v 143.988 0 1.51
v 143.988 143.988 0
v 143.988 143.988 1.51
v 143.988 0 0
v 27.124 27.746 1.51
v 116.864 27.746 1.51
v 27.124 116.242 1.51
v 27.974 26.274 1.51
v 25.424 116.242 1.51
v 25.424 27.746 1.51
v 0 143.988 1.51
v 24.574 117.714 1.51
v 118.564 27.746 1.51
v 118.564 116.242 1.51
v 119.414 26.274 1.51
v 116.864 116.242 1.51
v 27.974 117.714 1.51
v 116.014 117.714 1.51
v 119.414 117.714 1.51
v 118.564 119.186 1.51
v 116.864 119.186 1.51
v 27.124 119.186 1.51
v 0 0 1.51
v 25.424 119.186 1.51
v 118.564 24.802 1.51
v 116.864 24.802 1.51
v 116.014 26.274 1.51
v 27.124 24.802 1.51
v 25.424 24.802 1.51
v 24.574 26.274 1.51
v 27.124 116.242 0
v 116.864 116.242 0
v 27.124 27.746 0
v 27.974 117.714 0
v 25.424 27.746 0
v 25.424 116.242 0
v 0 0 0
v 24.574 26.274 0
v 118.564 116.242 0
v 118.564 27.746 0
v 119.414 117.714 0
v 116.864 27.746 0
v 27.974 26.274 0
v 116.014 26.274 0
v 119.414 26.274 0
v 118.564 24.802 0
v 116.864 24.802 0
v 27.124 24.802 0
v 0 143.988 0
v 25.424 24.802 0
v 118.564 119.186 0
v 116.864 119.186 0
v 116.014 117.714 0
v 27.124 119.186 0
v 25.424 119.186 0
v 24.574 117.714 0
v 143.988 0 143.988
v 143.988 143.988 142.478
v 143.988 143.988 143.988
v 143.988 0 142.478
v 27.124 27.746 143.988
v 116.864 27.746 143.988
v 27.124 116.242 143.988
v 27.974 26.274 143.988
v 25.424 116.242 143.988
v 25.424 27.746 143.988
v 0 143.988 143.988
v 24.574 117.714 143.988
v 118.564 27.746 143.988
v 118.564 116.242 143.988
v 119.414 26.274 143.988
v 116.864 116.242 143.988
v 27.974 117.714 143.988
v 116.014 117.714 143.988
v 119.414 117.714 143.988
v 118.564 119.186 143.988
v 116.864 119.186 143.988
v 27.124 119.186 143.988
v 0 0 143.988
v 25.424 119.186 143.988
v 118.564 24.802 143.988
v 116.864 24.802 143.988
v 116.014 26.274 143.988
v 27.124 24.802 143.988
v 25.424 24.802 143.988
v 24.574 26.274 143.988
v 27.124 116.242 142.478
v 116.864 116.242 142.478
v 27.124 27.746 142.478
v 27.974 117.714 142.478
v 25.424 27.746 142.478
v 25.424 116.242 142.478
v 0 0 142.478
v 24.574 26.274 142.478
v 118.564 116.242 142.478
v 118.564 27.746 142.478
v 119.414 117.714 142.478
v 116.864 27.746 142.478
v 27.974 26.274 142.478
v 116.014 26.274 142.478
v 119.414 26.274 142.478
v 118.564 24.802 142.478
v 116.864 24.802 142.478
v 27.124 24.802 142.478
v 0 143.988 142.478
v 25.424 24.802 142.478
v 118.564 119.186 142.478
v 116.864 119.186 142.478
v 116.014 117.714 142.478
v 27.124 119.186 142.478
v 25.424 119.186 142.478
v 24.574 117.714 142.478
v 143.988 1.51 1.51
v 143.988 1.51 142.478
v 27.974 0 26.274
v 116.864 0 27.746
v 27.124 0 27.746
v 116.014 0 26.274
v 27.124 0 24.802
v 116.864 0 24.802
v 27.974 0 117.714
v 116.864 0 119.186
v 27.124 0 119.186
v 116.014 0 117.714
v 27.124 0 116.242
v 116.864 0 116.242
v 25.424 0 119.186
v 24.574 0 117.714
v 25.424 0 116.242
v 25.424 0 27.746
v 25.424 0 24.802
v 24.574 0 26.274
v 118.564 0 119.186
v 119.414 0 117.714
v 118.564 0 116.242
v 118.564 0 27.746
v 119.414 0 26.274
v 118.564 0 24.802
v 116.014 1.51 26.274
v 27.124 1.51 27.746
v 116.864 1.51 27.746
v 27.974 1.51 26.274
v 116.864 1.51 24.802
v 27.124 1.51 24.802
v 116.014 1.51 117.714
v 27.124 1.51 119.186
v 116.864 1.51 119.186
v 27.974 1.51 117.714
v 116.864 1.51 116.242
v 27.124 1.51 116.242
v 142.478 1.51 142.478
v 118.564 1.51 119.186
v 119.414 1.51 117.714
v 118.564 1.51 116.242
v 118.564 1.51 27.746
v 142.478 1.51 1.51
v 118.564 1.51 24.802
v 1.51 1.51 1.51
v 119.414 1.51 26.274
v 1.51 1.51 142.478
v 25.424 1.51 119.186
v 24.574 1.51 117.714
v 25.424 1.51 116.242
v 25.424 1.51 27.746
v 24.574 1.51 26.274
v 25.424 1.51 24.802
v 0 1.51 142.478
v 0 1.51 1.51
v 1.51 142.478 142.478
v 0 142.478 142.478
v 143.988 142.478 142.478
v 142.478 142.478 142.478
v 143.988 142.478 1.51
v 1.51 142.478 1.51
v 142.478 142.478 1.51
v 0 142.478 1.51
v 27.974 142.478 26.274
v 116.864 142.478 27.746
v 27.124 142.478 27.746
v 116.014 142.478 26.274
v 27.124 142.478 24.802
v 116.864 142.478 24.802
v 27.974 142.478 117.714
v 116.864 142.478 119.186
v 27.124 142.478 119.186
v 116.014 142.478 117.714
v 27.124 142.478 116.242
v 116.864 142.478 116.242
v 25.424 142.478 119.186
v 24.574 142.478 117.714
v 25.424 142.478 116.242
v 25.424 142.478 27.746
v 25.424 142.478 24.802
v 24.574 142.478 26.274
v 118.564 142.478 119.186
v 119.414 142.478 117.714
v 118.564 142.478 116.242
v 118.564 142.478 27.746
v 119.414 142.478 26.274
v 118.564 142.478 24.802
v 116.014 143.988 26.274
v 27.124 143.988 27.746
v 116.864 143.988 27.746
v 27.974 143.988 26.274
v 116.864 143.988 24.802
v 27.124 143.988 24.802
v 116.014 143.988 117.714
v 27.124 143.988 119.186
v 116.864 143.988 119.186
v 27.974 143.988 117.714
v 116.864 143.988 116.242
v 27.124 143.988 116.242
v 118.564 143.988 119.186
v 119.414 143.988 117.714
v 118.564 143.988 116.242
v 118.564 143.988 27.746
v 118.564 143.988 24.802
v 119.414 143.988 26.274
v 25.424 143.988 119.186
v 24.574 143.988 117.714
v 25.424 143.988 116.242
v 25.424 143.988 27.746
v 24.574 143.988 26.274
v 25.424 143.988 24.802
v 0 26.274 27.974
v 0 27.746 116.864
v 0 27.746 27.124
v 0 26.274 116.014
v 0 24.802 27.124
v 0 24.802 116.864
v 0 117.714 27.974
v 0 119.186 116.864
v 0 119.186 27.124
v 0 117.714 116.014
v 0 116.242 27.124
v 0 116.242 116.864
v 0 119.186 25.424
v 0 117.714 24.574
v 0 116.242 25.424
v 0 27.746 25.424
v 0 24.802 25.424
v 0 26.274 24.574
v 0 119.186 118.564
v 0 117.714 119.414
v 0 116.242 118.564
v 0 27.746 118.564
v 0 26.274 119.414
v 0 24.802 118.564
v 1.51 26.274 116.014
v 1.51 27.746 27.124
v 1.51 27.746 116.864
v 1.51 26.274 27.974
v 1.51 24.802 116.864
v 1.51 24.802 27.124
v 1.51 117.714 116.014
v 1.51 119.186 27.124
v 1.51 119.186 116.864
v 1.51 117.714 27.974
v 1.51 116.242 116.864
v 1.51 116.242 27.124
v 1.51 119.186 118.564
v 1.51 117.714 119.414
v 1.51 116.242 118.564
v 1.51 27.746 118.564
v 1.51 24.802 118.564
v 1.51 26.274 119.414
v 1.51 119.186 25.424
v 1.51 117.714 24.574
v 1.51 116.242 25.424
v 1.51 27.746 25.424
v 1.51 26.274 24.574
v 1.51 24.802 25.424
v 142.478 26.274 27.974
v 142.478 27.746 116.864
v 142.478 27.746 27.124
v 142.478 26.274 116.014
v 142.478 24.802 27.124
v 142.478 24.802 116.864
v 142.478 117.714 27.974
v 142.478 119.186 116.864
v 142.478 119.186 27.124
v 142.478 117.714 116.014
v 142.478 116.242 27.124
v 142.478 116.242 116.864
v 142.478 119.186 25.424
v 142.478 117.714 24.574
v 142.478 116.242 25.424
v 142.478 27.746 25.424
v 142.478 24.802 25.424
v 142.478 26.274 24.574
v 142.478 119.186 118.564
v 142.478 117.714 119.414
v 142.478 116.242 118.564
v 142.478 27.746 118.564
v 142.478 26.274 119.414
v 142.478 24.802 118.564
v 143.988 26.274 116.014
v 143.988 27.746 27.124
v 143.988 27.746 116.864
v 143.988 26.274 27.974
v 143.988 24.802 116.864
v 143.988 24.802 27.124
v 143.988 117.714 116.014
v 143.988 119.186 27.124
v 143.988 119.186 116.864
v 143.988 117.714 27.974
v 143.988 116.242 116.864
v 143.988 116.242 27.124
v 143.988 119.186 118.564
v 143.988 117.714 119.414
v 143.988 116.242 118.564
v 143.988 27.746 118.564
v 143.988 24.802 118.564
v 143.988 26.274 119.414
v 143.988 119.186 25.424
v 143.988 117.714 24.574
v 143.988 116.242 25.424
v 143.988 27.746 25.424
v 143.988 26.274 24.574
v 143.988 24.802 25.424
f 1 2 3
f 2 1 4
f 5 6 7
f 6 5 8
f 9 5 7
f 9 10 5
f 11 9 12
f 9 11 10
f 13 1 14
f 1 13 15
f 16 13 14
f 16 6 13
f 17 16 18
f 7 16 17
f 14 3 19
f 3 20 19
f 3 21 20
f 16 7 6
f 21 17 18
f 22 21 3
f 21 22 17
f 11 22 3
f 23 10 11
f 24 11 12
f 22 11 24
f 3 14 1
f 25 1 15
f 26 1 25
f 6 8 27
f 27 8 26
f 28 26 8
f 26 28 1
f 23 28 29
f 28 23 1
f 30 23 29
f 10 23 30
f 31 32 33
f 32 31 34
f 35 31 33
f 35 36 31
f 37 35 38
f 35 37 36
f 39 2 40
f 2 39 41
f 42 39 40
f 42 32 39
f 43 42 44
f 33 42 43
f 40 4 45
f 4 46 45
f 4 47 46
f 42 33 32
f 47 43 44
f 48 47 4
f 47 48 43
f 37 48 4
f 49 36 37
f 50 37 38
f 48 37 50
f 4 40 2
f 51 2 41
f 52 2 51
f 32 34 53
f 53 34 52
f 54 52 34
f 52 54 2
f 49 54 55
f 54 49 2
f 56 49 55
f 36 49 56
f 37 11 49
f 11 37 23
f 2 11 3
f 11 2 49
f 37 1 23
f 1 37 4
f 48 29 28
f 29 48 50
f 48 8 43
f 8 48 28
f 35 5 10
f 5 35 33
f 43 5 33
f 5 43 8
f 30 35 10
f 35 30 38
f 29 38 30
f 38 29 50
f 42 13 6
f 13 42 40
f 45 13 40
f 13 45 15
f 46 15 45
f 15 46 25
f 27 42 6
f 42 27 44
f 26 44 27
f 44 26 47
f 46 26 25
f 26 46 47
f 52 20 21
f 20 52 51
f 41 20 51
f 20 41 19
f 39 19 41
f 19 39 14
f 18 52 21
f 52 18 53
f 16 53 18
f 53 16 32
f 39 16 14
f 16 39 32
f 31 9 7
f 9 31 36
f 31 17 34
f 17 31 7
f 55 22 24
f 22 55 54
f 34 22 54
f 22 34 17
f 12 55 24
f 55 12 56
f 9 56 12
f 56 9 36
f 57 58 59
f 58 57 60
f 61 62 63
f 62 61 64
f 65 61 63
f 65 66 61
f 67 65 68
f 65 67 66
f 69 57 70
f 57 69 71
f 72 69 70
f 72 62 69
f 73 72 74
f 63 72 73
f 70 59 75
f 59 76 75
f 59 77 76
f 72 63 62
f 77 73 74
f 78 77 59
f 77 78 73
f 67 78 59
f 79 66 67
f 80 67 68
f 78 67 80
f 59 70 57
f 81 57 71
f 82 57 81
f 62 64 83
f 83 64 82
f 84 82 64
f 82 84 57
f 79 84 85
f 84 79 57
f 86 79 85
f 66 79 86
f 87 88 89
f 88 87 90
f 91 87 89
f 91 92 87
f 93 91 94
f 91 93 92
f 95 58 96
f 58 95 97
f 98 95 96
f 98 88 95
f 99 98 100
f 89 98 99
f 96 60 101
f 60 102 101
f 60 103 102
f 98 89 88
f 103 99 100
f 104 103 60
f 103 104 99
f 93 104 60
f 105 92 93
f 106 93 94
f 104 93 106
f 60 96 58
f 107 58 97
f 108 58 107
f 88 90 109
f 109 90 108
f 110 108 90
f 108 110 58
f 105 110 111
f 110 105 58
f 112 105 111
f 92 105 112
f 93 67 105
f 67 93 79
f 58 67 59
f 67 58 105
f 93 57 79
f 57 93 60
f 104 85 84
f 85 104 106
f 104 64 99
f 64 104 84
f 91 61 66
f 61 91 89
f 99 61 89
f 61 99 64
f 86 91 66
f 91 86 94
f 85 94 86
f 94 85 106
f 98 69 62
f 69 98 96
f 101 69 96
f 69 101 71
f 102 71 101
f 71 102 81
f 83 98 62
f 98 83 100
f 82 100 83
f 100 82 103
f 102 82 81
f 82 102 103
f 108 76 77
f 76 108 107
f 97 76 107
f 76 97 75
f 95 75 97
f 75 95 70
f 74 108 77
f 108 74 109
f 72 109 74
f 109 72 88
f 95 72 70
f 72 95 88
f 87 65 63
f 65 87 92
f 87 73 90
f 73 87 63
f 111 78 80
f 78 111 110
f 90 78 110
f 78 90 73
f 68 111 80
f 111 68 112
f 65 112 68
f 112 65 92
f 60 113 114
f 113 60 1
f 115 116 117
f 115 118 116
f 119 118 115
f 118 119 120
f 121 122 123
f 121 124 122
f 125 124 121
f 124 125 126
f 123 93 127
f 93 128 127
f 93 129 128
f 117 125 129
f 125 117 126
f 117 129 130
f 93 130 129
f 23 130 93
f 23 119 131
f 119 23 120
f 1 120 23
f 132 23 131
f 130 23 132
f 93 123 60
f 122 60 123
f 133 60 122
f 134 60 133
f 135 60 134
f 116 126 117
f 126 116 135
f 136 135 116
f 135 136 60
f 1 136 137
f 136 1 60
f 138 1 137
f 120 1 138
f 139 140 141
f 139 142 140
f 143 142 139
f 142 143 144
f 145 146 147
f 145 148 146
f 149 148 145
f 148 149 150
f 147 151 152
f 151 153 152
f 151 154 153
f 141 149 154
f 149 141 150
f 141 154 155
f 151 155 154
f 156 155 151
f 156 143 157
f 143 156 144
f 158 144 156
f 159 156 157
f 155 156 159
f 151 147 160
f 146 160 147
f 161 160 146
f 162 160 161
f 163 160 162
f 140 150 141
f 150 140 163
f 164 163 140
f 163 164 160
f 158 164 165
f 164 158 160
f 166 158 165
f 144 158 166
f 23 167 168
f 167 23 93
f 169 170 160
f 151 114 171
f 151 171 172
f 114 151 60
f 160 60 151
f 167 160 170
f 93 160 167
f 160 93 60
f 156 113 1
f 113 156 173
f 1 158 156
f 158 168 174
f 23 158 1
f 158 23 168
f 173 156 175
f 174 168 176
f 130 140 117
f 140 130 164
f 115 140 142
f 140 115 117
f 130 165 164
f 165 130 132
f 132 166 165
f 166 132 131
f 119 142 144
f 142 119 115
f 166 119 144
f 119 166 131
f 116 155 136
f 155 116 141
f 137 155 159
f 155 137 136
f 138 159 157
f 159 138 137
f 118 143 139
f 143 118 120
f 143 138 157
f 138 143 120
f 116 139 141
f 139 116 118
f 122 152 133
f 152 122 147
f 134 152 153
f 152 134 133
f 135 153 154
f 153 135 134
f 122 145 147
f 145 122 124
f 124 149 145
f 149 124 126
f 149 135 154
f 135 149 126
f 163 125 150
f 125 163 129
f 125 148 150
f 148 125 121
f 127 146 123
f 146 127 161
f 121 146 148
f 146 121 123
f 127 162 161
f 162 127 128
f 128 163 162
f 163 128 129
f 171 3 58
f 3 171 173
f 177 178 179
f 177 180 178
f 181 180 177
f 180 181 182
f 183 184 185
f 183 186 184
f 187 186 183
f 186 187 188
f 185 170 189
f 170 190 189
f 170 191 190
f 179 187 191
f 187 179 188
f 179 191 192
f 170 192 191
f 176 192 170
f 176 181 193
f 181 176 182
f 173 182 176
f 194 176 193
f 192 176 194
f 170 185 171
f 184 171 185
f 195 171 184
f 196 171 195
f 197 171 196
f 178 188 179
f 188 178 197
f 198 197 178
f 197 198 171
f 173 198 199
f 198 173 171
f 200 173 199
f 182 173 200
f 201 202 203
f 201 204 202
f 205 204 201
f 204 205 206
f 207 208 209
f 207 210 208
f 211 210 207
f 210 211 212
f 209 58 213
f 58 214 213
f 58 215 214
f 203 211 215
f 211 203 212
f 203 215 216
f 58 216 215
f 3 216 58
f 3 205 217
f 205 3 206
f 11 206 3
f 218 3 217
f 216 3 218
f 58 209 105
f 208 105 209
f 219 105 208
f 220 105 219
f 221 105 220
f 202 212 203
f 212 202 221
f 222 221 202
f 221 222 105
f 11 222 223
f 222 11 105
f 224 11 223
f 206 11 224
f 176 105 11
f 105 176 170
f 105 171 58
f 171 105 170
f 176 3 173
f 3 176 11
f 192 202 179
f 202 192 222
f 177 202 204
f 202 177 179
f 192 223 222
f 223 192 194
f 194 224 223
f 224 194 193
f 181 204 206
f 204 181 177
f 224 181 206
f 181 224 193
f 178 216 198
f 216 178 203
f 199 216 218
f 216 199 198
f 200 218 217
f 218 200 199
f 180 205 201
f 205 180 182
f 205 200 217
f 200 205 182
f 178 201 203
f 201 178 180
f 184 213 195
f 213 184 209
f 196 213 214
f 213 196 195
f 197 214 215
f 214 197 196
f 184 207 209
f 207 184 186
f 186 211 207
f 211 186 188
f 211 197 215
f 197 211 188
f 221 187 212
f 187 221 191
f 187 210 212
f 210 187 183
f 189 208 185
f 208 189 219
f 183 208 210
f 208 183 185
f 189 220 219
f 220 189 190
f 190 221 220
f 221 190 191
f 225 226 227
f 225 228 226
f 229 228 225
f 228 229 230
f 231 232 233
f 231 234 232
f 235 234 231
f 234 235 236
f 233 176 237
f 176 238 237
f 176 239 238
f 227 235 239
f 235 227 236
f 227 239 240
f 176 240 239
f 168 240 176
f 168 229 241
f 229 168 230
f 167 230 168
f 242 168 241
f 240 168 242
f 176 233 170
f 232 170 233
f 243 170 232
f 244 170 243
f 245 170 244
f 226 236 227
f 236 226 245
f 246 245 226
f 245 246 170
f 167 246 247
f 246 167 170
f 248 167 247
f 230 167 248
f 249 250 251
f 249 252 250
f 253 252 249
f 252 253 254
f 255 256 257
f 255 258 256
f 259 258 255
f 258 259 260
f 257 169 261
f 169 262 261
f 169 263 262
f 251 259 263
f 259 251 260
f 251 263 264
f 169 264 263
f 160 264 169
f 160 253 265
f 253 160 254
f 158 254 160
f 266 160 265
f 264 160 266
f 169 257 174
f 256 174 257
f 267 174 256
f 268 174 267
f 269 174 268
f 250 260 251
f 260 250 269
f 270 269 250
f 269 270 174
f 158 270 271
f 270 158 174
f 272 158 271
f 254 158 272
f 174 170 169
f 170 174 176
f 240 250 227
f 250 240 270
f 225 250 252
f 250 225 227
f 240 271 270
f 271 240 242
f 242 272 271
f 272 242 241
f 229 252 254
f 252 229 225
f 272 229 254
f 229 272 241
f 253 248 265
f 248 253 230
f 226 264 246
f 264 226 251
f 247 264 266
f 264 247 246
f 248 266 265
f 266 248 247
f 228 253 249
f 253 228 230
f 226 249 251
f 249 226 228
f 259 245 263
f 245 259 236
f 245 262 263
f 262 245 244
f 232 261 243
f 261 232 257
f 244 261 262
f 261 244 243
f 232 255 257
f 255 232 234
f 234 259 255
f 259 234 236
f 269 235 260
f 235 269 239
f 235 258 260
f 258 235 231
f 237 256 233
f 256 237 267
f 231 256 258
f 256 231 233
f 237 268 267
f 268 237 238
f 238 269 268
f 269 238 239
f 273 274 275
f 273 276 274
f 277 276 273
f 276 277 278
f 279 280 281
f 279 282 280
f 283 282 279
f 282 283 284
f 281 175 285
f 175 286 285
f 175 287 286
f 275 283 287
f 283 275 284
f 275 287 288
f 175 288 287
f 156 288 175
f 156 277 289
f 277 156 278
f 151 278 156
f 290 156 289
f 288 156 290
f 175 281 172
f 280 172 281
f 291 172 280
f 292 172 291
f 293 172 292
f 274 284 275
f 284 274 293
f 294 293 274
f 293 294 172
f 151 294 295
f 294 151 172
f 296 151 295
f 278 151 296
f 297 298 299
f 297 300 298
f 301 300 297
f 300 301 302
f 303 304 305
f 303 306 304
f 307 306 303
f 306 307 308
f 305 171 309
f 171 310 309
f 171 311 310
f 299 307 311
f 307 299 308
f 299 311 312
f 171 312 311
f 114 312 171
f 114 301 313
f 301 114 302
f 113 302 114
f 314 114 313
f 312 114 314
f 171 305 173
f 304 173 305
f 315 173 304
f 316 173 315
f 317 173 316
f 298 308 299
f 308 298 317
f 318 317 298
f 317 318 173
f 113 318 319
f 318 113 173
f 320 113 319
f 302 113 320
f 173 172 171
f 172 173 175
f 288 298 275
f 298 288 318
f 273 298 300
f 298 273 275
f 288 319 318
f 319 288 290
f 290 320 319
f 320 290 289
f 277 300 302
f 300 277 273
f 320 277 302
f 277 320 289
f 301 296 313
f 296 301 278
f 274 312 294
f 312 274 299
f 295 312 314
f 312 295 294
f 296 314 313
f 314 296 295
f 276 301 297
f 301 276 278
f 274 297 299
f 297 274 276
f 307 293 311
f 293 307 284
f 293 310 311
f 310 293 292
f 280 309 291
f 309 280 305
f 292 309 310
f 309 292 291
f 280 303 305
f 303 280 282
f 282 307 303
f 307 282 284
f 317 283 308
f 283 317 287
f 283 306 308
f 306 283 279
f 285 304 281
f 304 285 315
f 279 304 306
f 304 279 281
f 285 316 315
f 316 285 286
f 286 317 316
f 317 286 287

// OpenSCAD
mm = 1;
module top(){
difference(){
    color([1, 1, 1, .4])cube([143.988*mm, 143.988*mm, 1.51*mm]);
    translate([26.274 * mm, 26.274 * mm, -1])cylinder(h=3.51*mm, r=1.7*mm);
    translate([117.714 * mm, 26.274 * mm, -1])cylinder(h=3.51*mm, r=1.7*mm);
    translate([117.714 * mm, 117.714 * mm, -1])cylinder(h=3.51*mm, r=1.7*mm);
    translate([26.274 * mm, 117.714 * mm, -1])cylinder(h=3.51*mm, r=1.7*mm);
}

}
module bottom(){
    translate([0, 0, 142.478*mm])top();
}

module front(){
translate([0, 1.51*mm, 1.51*mm])
rotate(v=[1, 0, 0], a=90)
difference(){
    color([1, 1, 1, .4])cube([143.988*mm, 140.968*mm, 1.51*mm]);
    translate([26.274 * mm, 24.764 * mm, -1])cylinder(h=3.51*mm, r=1.7*mm);
    translate([117.714 * mm, 24.764 * mm, -1])cylinder(h=3.51*mm, r=1.7*mm);
    translate([117.714 * mm, 116.204 * mm, -1])cylinder(h=3.51*mm, r=1.7*mm);
    translate([26.274 * mm, 116.204 * mm, -1])cylinder(h=3.51*mm, r=1.7*mm);
}

}
module back(){
    translate([0, 142.478*mm, 0])front();
}

module right(){
    translate([1.51*mm, 1.51*mm, 1.51*mm])
    rotate(v=[0, 1, 0], a=-90)
    difference(){
    color([1, 1, 1, .4])cube([140.968*mm, 140.968*mm, 1.51*mm]);
    translate([24.764 * mm, 24.764 * mm, -1])cylinder(h=3.51*mm, r=1.7*mm);
    translate([116.204 * mm, 24.764 * mm, -1])cylinder(h=3.51*mm, r=1.7*mm);
    translate([116.204 * mm, 116.204 * mm, -1])cylinder(h=3.51*mm, r=1.7*mm);
    translate([24.764 * mm, 116.204 * mm, -1])cylinder(h=3.51*mm, r=1.7*mm);
}

}
module left(){
translate([142.478*mm, 0, 0])
right();
}
module main(){
    top();
    bottom();
    front();
    back();
    right();
    left();
}
main();
